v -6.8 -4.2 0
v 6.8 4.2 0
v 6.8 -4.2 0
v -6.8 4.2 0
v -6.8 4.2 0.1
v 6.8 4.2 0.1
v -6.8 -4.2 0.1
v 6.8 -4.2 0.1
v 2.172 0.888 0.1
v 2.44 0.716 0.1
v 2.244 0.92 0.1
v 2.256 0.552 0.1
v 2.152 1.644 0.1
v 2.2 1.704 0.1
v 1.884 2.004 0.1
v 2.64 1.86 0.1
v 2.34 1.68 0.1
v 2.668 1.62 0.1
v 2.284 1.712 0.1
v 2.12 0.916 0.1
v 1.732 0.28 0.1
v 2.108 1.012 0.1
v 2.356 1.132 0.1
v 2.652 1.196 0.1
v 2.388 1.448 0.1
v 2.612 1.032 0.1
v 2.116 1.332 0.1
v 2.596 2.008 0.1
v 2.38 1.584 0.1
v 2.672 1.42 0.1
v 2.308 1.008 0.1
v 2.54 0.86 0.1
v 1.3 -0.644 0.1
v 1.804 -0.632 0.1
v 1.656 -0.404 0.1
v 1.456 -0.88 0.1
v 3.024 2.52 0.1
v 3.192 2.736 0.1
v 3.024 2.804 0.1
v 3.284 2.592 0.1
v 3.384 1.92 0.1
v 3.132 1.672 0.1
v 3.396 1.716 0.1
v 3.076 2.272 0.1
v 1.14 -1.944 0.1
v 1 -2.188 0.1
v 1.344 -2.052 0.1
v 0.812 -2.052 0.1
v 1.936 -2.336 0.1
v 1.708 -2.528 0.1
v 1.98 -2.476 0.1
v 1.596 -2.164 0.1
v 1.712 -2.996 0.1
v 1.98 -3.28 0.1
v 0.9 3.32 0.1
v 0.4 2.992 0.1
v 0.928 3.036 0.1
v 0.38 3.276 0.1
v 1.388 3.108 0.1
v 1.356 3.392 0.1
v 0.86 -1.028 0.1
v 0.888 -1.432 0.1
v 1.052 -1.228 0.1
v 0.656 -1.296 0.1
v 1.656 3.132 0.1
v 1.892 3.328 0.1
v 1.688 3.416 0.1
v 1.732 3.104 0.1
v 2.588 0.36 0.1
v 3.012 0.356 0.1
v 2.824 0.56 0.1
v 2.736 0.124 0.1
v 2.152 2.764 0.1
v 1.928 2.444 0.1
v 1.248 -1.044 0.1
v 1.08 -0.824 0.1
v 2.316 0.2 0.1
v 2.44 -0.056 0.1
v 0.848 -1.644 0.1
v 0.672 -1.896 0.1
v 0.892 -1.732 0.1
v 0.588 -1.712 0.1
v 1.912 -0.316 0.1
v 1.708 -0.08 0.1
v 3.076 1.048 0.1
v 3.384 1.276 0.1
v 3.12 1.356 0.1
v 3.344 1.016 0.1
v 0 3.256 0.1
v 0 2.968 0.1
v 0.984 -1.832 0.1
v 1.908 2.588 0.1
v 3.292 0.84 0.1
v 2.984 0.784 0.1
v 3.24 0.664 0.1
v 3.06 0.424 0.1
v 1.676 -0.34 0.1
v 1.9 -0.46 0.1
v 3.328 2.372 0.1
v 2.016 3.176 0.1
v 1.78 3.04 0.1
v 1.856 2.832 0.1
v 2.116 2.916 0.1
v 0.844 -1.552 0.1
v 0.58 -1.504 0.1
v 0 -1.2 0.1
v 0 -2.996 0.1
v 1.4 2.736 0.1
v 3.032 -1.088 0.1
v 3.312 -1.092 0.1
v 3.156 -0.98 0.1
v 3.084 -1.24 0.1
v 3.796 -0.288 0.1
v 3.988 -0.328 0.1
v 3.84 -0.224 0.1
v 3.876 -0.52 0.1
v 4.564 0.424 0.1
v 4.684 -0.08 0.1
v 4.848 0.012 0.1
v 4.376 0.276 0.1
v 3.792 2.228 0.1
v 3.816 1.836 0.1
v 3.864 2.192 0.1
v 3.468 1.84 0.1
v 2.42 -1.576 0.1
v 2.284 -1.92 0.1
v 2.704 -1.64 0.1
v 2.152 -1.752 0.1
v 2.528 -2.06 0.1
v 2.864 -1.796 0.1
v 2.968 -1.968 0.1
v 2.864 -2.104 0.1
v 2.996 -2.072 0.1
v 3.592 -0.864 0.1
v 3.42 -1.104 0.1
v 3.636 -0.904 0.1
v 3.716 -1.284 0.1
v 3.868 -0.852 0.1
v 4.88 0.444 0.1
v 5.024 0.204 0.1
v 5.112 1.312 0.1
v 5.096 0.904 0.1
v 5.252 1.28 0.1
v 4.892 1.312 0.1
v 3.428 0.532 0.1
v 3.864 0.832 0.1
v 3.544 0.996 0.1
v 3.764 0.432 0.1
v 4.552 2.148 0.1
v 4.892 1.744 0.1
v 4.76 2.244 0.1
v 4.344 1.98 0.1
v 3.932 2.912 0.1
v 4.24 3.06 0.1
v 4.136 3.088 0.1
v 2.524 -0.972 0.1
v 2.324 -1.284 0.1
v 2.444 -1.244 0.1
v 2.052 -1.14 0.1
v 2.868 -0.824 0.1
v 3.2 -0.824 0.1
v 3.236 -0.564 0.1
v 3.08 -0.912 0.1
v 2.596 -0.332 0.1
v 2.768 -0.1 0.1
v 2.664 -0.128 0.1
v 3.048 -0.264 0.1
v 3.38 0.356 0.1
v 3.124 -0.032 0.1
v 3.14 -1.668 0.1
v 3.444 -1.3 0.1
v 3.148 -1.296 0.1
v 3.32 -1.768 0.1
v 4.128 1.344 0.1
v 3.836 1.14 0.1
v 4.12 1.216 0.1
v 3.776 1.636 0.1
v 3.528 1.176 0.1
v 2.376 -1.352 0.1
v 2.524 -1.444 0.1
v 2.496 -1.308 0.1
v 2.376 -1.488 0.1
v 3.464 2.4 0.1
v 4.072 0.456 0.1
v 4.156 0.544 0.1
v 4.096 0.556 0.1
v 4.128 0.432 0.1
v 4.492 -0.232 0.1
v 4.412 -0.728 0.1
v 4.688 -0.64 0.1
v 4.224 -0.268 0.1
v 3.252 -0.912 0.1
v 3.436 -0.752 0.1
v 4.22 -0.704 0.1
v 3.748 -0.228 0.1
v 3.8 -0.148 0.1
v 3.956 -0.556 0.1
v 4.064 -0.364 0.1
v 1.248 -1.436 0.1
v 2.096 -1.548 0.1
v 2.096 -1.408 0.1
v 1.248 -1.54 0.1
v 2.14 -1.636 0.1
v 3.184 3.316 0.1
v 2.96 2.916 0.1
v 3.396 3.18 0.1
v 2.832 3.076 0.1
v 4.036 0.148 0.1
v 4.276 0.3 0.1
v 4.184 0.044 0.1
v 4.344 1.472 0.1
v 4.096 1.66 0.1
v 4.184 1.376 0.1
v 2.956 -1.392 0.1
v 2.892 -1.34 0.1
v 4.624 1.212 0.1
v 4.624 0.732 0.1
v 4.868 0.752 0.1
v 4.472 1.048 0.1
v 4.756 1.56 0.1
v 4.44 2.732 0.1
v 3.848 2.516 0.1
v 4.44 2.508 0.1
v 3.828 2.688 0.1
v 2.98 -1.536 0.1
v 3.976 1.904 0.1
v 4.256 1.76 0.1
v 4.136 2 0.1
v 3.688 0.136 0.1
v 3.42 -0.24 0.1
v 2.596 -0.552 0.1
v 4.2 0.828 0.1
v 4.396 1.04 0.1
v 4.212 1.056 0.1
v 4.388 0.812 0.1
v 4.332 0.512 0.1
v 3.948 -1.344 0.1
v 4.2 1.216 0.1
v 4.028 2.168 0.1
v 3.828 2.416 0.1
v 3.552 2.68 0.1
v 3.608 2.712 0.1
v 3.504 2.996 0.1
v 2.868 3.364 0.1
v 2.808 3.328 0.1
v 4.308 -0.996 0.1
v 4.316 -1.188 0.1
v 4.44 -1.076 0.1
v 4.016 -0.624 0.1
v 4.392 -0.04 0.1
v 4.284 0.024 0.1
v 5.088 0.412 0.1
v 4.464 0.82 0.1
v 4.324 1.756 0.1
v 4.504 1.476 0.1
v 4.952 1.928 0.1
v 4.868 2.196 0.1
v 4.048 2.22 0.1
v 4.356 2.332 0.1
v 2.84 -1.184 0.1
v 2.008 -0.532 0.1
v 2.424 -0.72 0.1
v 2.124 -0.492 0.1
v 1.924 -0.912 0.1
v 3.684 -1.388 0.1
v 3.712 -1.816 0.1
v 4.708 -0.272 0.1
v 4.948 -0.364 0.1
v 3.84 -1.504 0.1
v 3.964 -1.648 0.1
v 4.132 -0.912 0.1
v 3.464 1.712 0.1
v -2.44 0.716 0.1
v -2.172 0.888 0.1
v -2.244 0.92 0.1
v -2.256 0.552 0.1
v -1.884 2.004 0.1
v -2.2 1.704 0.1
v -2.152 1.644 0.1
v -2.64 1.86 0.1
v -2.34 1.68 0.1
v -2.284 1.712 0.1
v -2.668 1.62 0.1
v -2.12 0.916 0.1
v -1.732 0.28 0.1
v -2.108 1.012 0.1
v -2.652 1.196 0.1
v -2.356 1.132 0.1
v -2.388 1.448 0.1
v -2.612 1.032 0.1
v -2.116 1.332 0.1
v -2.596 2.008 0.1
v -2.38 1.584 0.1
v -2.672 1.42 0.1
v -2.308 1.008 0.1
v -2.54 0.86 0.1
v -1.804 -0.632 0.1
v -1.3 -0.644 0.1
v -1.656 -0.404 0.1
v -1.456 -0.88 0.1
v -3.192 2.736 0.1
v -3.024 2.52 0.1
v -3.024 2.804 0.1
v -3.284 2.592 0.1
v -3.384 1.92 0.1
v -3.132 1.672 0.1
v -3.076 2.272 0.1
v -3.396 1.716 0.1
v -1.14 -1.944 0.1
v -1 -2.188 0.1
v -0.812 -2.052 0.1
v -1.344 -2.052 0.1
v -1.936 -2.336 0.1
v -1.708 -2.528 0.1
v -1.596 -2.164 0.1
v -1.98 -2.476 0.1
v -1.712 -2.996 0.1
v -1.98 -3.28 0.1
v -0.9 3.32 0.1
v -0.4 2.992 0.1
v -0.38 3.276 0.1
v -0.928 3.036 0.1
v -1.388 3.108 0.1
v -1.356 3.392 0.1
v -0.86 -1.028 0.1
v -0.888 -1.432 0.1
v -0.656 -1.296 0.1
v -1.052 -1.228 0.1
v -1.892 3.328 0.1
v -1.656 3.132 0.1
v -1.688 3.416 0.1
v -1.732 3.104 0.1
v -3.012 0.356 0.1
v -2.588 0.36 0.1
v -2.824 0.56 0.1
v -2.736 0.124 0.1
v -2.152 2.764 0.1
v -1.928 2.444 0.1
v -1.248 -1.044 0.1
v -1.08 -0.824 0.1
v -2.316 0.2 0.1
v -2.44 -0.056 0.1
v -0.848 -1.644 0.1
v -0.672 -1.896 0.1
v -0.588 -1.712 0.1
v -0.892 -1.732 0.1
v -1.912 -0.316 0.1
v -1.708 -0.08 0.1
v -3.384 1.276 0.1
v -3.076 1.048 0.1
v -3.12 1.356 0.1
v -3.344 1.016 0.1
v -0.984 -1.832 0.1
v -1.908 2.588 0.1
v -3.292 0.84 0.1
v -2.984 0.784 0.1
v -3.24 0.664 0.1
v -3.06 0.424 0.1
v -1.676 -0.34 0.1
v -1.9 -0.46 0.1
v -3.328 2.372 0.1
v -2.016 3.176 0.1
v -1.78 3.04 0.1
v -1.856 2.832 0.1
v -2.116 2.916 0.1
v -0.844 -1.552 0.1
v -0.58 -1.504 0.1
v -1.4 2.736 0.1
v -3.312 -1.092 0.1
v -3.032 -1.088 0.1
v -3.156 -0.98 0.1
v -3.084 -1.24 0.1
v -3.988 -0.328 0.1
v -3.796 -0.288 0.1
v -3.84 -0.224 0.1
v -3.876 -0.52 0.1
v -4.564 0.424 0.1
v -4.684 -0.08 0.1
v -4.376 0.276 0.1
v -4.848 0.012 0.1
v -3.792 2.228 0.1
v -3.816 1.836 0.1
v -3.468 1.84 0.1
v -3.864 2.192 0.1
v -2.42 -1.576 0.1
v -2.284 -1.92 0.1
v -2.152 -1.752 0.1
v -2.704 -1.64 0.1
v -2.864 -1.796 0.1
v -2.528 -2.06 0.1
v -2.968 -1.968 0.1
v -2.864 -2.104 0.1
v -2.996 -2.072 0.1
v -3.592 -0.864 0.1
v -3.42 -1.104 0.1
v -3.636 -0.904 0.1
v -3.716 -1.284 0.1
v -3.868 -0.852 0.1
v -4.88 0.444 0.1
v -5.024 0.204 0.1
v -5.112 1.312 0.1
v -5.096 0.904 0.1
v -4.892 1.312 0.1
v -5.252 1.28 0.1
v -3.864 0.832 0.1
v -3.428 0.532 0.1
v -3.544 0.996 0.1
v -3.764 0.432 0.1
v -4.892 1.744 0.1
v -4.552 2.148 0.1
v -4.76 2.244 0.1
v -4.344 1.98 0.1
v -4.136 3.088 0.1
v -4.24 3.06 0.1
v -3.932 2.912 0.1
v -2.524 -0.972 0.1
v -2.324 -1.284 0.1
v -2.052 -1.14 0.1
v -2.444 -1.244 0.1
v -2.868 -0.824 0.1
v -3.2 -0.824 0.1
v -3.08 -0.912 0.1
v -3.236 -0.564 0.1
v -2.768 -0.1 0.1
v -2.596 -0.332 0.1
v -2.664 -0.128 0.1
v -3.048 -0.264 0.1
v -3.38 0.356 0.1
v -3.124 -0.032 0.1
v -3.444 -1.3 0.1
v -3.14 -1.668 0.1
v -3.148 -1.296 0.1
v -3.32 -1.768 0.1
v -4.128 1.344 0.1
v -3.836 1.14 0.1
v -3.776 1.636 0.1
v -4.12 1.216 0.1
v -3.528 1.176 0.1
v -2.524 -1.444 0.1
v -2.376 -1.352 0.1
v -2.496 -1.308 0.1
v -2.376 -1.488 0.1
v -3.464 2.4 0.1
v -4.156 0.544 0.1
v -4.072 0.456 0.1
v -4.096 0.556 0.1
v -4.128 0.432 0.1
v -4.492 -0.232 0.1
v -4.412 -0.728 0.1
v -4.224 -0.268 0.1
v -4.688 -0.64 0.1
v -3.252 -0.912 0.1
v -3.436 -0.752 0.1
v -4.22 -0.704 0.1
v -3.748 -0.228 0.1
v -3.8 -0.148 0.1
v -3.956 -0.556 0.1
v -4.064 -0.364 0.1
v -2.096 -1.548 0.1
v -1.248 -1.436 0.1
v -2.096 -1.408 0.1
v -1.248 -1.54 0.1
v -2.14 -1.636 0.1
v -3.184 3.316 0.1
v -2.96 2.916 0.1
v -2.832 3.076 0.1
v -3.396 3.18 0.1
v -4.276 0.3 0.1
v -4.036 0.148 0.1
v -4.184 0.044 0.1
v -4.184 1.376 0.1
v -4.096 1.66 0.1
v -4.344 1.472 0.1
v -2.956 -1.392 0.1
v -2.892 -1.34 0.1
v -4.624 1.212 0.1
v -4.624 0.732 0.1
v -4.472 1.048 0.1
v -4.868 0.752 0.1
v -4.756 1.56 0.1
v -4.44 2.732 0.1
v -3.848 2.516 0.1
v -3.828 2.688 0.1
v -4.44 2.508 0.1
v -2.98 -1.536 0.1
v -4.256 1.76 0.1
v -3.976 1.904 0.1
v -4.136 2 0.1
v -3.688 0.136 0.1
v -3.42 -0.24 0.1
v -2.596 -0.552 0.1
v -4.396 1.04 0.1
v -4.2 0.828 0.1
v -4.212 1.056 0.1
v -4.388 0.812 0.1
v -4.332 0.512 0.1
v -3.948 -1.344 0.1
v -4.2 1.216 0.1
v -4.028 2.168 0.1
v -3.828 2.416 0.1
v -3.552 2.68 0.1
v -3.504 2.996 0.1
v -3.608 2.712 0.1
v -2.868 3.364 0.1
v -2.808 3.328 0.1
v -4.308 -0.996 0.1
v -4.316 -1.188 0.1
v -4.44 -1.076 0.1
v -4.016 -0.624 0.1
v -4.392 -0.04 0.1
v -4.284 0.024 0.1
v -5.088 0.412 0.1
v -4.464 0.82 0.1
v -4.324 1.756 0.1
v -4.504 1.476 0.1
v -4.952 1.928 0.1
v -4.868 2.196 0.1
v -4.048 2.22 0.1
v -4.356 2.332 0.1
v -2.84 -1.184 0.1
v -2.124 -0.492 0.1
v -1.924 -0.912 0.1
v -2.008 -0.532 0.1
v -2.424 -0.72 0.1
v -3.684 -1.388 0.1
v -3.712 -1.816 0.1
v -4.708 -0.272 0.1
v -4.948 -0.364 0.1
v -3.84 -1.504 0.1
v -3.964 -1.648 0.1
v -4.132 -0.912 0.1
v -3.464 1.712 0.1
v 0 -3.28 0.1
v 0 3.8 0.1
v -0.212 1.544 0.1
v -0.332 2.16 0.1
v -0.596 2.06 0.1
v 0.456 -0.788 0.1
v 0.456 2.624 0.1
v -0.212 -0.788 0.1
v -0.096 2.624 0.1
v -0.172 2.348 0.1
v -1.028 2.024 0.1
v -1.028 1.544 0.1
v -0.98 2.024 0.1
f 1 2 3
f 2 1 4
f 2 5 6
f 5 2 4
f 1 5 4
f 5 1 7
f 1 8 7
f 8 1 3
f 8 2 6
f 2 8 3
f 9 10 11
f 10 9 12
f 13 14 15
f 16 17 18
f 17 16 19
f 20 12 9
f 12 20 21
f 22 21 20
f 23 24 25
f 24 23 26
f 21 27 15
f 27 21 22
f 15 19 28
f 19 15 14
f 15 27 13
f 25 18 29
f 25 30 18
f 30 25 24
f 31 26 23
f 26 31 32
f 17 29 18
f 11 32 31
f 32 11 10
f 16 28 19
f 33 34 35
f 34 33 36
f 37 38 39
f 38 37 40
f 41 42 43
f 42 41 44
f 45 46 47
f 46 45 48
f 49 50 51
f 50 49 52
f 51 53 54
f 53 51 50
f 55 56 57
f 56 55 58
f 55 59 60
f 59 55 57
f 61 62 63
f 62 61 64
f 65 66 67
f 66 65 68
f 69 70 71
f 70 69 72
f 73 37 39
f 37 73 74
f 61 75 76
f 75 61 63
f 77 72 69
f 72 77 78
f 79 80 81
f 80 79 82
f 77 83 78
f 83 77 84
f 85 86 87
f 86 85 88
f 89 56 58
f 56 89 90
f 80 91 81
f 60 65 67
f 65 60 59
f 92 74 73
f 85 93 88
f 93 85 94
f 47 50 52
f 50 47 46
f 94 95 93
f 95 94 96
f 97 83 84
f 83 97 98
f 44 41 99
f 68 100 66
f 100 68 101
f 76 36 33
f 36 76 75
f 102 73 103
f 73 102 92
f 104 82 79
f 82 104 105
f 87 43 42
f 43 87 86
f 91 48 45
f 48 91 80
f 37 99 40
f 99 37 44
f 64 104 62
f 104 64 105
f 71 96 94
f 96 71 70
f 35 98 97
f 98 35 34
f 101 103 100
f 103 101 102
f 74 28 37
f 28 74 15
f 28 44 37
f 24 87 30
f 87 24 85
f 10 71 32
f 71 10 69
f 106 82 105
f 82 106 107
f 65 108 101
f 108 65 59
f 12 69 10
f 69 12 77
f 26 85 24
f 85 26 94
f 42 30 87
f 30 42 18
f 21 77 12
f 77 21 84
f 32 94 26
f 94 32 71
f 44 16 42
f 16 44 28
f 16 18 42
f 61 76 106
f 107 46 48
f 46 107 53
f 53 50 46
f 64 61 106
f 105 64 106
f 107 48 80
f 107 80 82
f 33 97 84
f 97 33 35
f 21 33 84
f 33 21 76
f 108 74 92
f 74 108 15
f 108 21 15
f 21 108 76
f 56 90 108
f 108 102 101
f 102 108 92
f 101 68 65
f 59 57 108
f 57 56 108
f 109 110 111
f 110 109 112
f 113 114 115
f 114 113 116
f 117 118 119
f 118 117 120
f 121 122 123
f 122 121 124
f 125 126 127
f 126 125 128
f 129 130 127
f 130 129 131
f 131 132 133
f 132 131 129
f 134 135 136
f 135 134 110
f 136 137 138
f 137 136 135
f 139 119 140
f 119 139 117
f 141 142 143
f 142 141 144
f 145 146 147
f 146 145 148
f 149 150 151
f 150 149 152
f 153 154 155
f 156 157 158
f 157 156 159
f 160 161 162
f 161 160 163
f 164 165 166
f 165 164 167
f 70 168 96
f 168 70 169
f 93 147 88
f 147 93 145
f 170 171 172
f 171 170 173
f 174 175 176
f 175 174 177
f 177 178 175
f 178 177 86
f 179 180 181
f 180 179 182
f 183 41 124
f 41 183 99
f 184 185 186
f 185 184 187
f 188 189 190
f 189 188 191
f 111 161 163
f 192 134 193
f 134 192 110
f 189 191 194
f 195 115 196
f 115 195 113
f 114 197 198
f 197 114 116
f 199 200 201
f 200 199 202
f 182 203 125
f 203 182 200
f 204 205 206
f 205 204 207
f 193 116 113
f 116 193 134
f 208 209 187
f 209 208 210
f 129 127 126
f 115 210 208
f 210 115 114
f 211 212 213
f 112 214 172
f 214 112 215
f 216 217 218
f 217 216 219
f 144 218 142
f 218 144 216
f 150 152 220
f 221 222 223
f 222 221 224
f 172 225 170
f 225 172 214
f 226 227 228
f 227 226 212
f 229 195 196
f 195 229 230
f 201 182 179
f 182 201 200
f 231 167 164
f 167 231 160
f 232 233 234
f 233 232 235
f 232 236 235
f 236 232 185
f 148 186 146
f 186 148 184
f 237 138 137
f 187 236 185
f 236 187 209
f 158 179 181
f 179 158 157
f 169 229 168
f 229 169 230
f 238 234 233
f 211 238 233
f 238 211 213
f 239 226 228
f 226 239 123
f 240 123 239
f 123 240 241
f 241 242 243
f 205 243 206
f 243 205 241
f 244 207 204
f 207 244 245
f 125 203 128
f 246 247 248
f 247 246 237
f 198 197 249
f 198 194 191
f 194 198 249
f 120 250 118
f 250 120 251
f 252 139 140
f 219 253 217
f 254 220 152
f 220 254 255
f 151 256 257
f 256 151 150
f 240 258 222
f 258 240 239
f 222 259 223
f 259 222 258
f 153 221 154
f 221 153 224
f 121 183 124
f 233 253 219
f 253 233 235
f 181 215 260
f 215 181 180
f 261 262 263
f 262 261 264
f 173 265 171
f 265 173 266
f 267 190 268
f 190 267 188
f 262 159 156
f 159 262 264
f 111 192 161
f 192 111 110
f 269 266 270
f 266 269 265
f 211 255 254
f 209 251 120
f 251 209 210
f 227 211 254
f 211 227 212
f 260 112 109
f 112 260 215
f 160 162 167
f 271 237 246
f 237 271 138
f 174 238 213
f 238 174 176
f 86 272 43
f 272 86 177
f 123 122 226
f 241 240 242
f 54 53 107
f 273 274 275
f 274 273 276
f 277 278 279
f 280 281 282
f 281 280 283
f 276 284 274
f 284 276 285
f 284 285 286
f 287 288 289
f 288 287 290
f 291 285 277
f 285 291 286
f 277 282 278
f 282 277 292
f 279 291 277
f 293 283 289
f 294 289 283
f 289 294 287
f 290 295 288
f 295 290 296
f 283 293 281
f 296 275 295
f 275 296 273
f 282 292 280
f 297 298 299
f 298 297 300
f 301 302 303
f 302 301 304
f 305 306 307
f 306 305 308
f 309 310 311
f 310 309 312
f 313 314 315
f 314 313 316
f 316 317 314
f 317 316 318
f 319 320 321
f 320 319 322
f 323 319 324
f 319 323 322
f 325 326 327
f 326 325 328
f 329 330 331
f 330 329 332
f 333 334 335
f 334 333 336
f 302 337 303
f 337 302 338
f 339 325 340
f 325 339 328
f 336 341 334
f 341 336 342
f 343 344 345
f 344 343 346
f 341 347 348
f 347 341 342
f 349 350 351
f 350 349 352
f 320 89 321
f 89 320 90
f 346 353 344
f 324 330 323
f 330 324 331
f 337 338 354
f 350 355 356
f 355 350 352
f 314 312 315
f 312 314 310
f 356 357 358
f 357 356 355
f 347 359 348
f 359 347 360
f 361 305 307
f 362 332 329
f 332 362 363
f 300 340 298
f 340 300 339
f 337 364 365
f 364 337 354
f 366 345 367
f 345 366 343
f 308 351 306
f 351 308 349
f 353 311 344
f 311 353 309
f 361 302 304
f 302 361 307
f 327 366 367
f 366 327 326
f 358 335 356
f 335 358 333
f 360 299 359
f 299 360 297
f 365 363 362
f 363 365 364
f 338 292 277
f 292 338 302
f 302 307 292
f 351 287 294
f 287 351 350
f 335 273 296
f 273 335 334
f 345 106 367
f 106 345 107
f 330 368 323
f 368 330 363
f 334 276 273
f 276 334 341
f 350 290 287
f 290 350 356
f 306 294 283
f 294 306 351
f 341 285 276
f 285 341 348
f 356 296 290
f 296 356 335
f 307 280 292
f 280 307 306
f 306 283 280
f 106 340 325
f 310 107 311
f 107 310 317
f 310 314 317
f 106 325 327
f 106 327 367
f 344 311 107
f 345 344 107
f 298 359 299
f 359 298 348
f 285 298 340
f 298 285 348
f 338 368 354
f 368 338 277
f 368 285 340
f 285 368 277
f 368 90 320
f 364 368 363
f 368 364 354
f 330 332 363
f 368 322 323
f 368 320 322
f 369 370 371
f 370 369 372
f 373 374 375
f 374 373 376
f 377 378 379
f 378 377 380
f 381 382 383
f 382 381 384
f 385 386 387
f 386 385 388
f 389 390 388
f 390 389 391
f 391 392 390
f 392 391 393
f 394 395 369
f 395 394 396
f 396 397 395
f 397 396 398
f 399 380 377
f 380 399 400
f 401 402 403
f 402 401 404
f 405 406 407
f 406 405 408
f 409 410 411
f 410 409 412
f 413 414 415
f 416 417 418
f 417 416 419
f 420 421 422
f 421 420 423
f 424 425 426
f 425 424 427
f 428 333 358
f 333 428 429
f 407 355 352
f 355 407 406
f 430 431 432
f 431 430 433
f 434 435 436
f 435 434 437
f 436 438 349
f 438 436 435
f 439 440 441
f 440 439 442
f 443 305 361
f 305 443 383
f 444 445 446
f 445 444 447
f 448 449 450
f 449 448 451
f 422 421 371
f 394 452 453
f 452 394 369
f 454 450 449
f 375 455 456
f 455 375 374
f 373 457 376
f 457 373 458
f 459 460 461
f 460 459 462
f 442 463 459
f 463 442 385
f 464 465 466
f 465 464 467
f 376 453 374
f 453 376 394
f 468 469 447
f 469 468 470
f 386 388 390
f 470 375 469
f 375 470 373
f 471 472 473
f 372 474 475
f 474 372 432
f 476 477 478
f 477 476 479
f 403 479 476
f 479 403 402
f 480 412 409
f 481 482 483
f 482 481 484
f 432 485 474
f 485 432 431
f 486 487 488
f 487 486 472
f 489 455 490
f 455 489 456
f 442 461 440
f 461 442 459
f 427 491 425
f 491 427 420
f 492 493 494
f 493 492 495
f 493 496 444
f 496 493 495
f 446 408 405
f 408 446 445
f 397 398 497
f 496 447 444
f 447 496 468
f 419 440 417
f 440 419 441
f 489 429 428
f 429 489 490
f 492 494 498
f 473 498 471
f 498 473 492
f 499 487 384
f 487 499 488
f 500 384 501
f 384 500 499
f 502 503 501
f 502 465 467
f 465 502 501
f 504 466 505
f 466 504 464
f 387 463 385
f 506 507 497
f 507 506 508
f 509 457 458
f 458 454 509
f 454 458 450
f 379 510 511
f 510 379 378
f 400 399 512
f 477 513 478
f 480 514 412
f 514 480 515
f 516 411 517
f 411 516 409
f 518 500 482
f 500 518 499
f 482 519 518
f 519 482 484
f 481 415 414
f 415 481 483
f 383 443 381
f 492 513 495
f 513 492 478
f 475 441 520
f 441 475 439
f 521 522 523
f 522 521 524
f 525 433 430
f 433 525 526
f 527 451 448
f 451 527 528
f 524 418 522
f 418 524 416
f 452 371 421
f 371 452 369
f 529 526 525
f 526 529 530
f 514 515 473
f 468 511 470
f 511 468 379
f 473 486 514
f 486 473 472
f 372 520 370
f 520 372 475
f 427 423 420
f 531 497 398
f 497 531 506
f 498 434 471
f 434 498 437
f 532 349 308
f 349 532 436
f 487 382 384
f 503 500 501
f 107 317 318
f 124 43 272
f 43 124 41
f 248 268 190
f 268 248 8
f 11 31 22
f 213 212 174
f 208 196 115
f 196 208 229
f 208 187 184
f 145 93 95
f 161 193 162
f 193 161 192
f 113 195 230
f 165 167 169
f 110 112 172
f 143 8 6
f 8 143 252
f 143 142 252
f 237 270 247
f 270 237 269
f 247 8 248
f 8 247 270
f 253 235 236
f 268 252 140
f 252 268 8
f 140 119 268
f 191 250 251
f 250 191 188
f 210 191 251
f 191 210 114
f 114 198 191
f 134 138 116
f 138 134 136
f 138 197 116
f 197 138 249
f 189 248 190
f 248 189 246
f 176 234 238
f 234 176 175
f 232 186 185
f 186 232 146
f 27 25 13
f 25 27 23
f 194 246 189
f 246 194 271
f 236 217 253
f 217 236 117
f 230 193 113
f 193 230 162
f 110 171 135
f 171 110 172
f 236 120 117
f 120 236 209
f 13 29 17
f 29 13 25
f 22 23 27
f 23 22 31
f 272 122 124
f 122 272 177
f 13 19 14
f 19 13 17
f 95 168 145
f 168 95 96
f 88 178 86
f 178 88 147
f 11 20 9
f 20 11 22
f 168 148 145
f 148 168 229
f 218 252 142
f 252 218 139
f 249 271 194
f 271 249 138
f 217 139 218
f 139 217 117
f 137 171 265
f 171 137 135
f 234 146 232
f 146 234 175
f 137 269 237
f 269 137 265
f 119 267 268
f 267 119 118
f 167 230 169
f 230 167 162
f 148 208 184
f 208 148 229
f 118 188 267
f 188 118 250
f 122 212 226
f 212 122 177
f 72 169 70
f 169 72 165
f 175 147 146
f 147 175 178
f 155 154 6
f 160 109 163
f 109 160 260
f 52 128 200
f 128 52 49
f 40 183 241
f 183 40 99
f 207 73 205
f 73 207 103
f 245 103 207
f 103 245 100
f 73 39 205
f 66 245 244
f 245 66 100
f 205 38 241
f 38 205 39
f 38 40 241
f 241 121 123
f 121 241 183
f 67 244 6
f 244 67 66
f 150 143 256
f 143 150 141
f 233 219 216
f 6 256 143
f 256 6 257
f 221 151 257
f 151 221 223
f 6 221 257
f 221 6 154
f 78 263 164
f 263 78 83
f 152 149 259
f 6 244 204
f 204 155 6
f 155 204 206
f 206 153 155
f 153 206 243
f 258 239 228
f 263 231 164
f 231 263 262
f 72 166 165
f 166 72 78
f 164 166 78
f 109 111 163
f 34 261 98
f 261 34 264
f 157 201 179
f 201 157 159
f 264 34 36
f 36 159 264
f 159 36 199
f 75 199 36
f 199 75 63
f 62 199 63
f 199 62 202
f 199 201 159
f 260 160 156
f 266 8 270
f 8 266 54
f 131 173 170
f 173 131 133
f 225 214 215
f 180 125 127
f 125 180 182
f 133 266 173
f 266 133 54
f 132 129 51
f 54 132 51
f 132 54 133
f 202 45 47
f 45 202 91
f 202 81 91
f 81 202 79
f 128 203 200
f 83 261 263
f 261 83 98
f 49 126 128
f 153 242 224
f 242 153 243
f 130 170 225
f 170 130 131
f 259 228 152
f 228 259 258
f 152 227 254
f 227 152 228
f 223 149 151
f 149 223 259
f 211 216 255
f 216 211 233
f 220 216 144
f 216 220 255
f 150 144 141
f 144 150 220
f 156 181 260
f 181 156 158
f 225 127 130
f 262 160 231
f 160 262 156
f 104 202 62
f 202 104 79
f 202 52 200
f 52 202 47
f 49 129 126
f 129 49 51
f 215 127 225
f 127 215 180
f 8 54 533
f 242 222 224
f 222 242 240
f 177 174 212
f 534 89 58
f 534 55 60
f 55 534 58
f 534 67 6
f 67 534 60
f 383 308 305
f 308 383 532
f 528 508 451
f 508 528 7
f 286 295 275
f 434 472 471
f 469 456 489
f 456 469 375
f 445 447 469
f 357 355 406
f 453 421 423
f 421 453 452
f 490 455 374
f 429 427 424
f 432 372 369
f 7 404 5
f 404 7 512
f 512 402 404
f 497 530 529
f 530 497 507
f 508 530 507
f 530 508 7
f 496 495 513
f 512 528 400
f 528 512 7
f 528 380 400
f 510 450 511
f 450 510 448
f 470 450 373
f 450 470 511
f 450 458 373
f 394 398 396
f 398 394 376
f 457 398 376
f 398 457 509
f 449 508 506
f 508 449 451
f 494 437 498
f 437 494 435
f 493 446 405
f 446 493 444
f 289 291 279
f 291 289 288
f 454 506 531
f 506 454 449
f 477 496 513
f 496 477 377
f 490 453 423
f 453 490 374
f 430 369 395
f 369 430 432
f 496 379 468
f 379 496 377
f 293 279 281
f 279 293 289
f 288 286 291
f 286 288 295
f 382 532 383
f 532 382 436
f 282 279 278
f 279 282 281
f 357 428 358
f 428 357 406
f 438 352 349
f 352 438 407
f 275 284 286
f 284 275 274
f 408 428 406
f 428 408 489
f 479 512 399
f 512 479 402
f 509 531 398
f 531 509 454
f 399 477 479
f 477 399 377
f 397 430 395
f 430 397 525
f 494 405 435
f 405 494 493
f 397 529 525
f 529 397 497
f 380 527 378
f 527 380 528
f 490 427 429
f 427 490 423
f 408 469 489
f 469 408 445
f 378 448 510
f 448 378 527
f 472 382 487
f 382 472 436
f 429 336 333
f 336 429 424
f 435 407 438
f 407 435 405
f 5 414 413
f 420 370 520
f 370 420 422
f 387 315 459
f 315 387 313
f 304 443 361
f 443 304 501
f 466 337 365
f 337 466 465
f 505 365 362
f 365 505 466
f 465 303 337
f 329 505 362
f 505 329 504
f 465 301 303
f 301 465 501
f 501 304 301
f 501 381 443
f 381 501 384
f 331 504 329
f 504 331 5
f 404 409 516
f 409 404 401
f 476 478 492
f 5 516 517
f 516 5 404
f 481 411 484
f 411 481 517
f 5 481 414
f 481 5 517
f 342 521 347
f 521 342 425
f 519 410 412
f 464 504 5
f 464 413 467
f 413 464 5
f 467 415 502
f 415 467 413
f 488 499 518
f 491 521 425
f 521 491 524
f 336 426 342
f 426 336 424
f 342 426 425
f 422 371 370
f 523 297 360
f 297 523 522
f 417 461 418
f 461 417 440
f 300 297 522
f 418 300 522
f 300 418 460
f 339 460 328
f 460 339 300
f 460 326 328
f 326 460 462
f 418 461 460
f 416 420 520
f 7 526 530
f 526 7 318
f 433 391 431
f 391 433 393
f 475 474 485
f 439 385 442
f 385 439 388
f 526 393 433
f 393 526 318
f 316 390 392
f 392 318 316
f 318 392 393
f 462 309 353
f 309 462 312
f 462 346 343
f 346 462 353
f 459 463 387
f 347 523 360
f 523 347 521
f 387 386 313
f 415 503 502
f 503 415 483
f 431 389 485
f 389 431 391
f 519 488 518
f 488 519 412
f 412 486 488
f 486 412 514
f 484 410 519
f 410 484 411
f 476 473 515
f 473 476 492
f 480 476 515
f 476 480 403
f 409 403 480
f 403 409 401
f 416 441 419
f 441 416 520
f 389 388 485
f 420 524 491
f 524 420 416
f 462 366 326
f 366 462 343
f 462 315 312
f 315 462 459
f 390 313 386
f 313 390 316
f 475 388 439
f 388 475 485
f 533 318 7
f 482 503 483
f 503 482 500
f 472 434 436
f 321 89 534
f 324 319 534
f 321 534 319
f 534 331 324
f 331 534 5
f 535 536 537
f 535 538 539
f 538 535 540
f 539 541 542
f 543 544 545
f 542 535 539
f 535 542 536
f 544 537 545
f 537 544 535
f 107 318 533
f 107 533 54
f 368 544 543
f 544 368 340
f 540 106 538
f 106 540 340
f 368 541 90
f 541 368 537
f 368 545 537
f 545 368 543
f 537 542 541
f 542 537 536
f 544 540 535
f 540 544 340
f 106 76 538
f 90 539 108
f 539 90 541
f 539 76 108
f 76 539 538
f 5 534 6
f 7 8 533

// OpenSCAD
// file: s/170877bs03.scad
use <../../lib.scad>
function ldraw_lib__s__170877bs03() = [
// 0 ~Sticker  1.1 x  1.7 with 1st Place Cup and Laurel Pattern - Number
// 0 Name: s\170877bs03.dat
// 0 Author: Max Seidenstücker [MaxSeidenstuecker]
// 0 !LDRAW_ORG Subpart UPDATE 2025-10
// 0 !LICENSE Licensed under CC BY 4.0 : see CAreadme.txt
// 
// 0 BFC CERTIFY CCW
  [0,"BFC","CERTIFY"],
  [0,"BFC","CCW"],
// 
// 0 !HISTORY 2025-10-27 [OrionP] Official Update 2025-10
// 
// 3 0 -.53 0 3.86 -.83 0 5.4 -1.49 0 5.15
  [3,0,-.53,0,3.86,-.83,0,5.4,-1.49,0,5.15],
// 4 0 1.14 0 6.56 -.53 0 3.86 -.53 0 -1.97 1.14 0 -1.97
  [4,0,1.14,0,6.56,-.53,0,3.86,-.53,0,-1.97,1.14,0,-1.97],
// 3 0 1.14 0 6.56 -.24 0 6.56 -.43 0 5.87
  [3,0,1.14,0,6.56,-.24,0,6.56,-.43,0,5.87],
// 3 0 -2.57 0 5.06 -2.57 0 3.86 -2.45 0 5.06
  [3,0,-2.57,0,5.06,-2.57,0,3.86,-2.45,0,5.06],
// 4 0 1.14 0 6.56 -.43 0 5.87 -.83 0 5.4 -.53 0 3.86
  [4,0,1.14,0,6.56,-.43,0,5.87,-.83,0,5.4,-.53,0,3.86],
// 4 0 -2.45 0 5.06 -2.57 0 3.86 -.53 0 3.86 -1.49 0 5.15
  [4,0,-2.45,0,5.06,-2.57,0,3.86,-.53,0,3.86,-1.49,0,5.15],
// 3 0 0 0 -7.49 -4.95 0 -8.2 0 0 -8.2
  [3,0,0,0,-7.49,-4.95,0,-8.2,0,0,-8.2],
// 3 0 0 0 -7.49 0 0 -8.2 4.95 0 -8.2
  [3,0,0,0,-7.49,0,0,-8.2,4.95,0,-8.2],
// 
// 4 14 -2.57 0 5.06 -3.5 0 6.84 -2.7 0 -2.06 -2.57 0 3.86
  [4,14,-2.57,0,5.06,-3.5,0,6.84,-2.7,0,-2.06,-2.57,0,3.86],
// 4 14 1.14 0 -1.97 -.53 0 -1.97 -2.7 0 -2.06 0 0 -3
  [4,14,1.14,0,-1.97,-.53,0,-1.97,-2.7,0,-2.06,0,0,-3],
// 4 14 -1.49 0 5.15 -.24 0 6.56 0 0 7.42 -3.5 0 6.84
  [4,14,-1.49,0,5.15,-.24,0,6.56,0,0,7.42,-3.5,0,6.84],
// 4 14 -2.57 0 5.06 -2.45 0 5.06 -1.49 0 5.15 -3.5 0 6.84
  [4,14,-2.57,0,5.06,-2.45,0,5.06,-1.49,0,5.15,-3.5,0,6.84],
// 4 14 -.83 0 5.4 -.43 0 5.87 -.24 0 6.56 -1.49 0 5.15
  [4,14,-.83,0,5.4,-.43,0,5.87,-.24,0,6.56,-1.49,0,5.15],
// 4 14 -2.7 0 -2.06 -.53 0 -1.97 -.53 0 3.86 -2.57 0 3.86
  [4,14,-2.7,0,-2.06,-.53,0,-1.97,-.53,0,3.86,-2.57,0,3.86],
// 3 14 0 0 -3 2.7 0 -2.06 1.14 0 -1.97
  [3,14,0,0,-3,2.7,0,-2.06,1.14,0,-1.97],
// 4 14 -.24 0 6.56 1.14 0 6.56 3.5 0 6.84 0 0 7.42
  [4,14,-.24,0,6.56,1.14,0,6.56,3.5,0,6.84,0,0,7.42],
// 4 14 3.5 0 6.84 1.14 0 6.56 1.14 0 -1.97 2.7 0 -2.06
  [4,14,3.5,0,6.84,1.14,0,6.56,1.14,0,-1.97,2.7,0,-2.06],
// 
// 3 16 -17 0 10.5 0 0 9.5 17 0 10.5
  [3,16,-17,0,10.5,0,0,9.5,17,0,10.5],
// 3 16 -17 0 -10.5 17 0 -10.5 0 0 -8.2
  [3,16,-17,0,-10.5,17,0,-10.5,0,0,-8.2],
];
module ldraw_lib__s__170877bs03(step=0, col=false, unit=2/5, alt=false, line=0.2, solid=!$preview)
    makepoly(ldraw_lib__s__170877bs03(), step=step, col=col, unit=unit, alt=alt, line=line, solid=solid);
ldraw_lib__s__170877bs03(line=0.2);
// file: ../p/box5-12.scad
use <../lib.scad>
function ldraw_lib__box5_12() = [
// 0 Box with 5 Faces without Any Edges
// 0 Name: box5-12.dat
// 0 Author: Chris Dee [cwdee]
// 0 !LDRAW_ORG Primitive UPDATE 2009-02
// 0 !LICENSE Licensed under CC BY 4.0 : see CAreadme.txt
// 
// 0 BFC CERTIFY CCW
  [0,"BFC","CERTIFY"],
  [0,"BFC","CCW"],
// 
// 0 !HISTORY 2009-09-03 [PTadmin] Official Update 2009-02
// 
// 
// 4 16 1 1 1 1 1 -1 -1 1 -1 -1 1 1
  [4,16,1,1,1,1,1,-1,-1,1,-1,-1,1,1],
// 4 16 -1 0 1 1 0 1 1 1 1 -1 1 1
  [4,16,-1,0,1,1,0,1,1,1,1,-1,1,1],
// 4 16 -1 0 -1 -1 0 1 -1 1 1 -1 1 -1
  [4,16,-1,0,-1,-1,0,1,-1,1,1,-1,1,-1],
// 4 16 1 0 -1 -1 0 -1 -1 1 -1 1 1 -1
  [4,16,1,0,-1,-1,0,-1,-1,1,-1,1,1,-1],
// 4 16 1 0 1 1 0 -1 1 1 -1 1 1 1
  [4,16,1,0,1,1,0,-1,1,1,-1,1,1,1],
// 0
];
module ldraw_lib__box5_12(step=0, col=false, unit=2/5, alt=false, line=0.2, solid=!$preview)
    makepoly(ldraw_lib__box5_12(), step=step, col=col, unit=unit, alt=alt, line=line, solid=solid);
ldraw_lib__box5_12(line=0.2);
// main file
use <../lib.scad>
use <../p/box5-12.scad>
use <s/170877bs01.scad>
use <s/170877bs02.scad>
use <s/170877bs03.scad>
function ldraw_lib__170877b() = [
// 0 Sticker  1.1 x  1.7 with 1st Place Cup and Laurels
// 0 Name: 170877b.dat
// 0 Author: Max Seidenstücker [MaxSeidenstuecker]
// 0 !LDRAW_ORG Part UPDATE 2025-10
// 0 !LICENSE Licensed under CC BY 4.0 : see CAreadme.txt
// 
// 0 BFC CERTIFY CCW
  [0,"BFC","CERTIFY"],
  [0,"BFC","CCW"],
// 
// 0 !KEYWORDS BrickLink 6337stk01, Rebrickable 170877, Set 6337 Fast Track Finish
// 
// 0 !HISTORY 2025-10-27 [OrionP] Official Update 2025-10
// 
// 1 16 0 -.25 0 17 0 0 0 .25 0 0 0 10.5 box5-12.dat
  [1,16,0,-.25,0,17,0,0,0,.25,0,0,0,10.5, ldraw_lib__box5_12()],
// 1 16 0 -.25 0 1 0 0 0 1 0 0 0 1 s\170877bs01.dat
  [1,16,0,-.25,0,1,0,0,0,1,0,0,0,1, ldraw_lib__s__170877bs01()],
// 1 16 0 -.25 0 -1 0 0 0 1 0 0 0 1 s\170877bs01.dat
  [1,16,0,-.25,0,-1,0,0,0,1,0,0,0,1, ldraw_lib__s__170877bs01()],
// 1 15 0 -.25 0 1 0 0 0 1 0 0 0 1 s\170877bs02.dat
  [1,15,0,-.25,0,1,0,0,0,1,0,0,0,1, ldraw_lib__s__170877bs02()],
// 1 15 0 -.25 0 -1 0 0 0 1 0 0 0 1 s\170877bs02.dat
  [1,15,0,-.25,0,-1,0,0,0,1,0,0,0,1, ldraw_lib__s__170877bs02()],
// 1 15 0 -.25 0 1 0 0 0 1 0 0 0 1 s\170877bs03.dat
  [1,15,0,-.25,0,1,0,0,0,1,0,0,0,1, ldraw_lib__s__170877bs03()],
];
module ldraw_lib__170877b(step=0, col=false, unit=2/5, alt=false, line=0.2, solid=!$preview)
    makepoly(ldraw_lib__170877b(), step=step, col=col, unit=unit, alt=alt, line=line, solid=solid);
ldraw_lib__170877b(line=0.2);
